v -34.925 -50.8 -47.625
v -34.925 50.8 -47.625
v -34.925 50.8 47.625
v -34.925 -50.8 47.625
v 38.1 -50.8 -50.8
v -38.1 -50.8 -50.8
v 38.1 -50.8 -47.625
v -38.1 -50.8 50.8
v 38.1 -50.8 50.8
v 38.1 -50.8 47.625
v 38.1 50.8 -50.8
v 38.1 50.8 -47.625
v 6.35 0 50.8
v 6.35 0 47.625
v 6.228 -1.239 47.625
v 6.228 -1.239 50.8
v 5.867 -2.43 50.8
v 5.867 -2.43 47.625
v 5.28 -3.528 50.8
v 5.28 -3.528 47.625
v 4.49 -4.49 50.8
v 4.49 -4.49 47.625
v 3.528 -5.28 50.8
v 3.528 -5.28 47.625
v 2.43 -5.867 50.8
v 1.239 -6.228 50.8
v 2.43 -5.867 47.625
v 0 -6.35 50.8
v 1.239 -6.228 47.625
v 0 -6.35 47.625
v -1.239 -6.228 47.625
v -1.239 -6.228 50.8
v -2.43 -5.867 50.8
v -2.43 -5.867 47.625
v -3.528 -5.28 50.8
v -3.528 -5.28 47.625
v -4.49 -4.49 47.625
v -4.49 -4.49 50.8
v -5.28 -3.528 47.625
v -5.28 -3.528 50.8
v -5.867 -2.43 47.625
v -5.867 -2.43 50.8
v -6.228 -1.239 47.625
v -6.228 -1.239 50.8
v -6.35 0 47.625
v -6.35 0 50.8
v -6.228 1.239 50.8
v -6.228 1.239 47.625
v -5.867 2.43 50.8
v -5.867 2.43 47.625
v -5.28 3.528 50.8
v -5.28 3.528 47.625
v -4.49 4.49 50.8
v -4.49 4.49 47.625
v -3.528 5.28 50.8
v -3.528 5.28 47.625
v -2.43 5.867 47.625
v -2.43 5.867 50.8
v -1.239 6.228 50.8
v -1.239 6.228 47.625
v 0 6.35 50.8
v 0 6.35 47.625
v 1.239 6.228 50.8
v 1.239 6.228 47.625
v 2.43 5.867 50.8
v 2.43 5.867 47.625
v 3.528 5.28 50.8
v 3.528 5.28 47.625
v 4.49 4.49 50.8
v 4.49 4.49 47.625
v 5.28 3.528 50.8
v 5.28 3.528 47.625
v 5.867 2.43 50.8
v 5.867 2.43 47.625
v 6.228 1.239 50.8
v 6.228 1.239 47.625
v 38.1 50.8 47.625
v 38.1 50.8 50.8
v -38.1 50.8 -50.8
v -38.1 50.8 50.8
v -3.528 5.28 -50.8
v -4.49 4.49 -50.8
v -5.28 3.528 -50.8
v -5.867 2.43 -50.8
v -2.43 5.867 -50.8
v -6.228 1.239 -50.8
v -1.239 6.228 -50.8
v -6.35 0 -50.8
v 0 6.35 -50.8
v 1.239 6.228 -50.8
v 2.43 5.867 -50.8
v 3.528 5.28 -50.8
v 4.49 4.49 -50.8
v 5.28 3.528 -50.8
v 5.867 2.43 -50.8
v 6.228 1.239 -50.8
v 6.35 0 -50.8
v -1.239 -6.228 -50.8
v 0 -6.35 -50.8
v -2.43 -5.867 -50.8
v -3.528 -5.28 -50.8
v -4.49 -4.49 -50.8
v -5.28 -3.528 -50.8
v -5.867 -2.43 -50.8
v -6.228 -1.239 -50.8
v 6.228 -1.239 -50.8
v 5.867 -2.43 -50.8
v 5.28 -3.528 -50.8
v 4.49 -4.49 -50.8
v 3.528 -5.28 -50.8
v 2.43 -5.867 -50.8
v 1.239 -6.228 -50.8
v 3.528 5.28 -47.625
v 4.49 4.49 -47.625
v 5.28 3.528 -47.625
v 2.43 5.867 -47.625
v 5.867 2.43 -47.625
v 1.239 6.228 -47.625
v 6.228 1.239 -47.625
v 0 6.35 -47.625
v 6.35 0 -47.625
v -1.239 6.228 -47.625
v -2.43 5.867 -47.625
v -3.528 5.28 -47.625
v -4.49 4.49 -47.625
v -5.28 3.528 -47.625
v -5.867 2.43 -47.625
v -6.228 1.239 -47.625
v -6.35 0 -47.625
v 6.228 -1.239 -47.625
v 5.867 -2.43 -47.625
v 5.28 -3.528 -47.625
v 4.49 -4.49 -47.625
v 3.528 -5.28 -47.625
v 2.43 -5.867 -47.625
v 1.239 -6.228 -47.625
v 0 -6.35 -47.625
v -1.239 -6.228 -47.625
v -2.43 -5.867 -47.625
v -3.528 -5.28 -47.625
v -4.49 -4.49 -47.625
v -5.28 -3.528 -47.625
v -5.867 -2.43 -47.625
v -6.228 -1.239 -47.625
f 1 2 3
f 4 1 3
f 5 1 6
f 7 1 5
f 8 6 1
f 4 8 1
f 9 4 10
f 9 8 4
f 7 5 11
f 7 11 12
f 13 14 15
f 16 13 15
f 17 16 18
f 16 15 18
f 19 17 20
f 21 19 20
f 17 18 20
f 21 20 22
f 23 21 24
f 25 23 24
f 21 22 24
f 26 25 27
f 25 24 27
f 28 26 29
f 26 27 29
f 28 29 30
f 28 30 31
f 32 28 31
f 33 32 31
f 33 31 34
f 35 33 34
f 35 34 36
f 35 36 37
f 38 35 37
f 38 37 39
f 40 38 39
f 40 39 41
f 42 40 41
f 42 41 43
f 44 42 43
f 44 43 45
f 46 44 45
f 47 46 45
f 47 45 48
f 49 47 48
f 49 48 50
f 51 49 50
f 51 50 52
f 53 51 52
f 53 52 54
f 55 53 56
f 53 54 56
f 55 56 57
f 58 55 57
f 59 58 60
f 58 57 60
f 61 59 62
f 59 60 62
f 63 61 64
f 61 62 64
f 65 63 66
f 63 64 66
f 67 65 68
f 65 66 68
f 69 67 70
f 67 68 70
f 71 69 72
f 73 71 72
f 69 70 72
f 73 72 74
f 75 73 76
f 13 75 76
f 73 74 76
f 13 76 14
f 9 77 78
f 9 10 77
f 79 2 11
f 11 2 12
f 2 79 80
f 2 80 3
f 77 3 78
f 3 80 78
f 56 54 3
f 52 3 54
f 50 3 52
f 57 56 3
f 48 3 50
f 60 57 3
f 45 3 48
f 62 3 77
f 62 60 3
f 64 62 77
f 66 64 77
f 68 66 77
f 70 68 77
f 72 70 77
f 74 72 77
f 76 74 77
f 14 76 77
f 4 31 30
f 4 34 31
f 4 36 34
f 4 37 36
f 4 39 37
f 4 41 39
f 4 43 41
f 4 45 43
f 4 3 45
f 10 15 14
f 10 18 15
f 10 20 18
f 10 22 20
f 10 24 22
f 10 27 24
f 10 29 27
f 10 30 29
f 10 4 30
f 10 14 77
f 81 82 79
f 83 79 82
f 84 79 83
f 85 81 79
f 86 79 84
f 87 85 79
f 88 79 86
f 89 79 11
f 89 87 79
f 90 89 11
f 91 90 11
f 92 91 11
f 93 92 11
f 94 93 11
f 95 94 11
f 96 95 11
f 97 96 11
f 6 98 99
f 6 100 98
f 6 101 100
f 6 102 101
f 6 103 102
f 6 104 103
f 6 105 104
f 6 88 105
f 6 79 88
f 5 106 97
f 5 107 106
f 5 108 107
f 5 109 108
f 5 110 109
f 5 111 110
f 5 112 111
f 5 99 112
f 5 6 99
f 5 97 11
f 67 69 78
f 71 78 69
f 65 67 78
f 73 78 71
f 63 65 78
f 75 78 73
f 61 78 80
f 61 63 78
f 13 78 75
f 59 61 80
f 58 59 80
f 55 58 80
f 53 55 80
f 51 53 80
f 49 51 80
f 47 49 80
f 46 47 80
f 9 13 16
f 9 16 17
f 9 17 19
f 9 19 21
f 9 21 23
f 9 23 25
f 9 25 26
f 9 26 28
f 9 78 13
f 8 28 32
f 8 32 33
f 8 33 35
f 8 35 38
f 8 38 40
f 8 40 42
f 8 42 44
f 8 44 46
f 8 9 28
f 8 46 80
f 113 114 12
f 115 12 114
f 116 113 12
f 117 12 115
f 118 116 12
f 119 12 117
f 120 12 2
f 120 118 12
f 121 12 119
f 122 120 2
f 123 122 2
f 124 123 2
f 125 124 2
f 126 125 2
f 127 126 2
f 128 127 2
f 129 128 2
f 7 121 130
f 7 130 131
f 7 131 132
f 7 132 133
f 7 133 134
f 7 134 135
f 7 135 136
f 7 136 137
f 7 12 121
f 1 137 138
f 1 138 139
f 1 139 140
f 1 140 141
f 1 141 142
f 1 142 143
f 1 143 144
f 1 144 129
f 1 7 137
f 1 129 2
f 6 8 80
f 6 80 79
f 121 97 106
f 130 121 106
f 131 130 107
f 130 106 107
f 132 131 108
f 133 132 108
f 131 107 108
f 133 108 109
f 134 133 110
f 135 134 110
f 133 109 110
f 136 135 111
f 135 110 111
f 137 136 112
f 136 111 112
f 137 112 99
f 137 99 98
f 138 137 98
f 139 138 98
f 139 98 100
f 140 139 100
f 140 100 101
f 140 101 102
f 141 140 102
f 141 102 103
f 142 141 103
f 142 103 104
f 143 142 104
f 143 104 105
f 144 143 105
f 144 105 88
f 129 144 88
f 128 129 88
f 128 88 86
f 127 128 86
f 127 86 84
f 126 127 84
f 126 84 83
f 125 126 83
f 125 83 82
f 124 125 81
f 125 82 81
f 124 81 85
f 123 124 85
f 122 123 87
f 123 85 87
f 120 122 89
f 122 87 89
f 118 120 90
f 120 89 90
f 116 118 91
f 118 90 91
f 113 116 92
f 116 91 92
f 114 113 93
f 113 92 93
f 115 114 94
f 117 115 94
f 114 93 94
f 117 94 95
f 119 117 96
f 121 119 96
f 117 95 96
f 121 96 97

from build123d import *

# Parameters (mm, degrees)
F1_DEPTH = 50.8
F2_R     = 6.35
F3_DEPTH = 101.601


with BuildPart() as f1:
    # F0 (on Front) → F1 (new body, symmetric)
    with BuildSketch(Plane.XZ):
        Polygon((38.1, 47.625), (38.1, 50.8), (-38.1, 50.8), (-38.1, -50.8), (38.1, -50.8), (38.1, -47.625), (-34.925, -47.625), (-34.925, 47.625), align=None)
    extrude(amount=F1_DEPTH, both=True)

    # F2 (on face) → F3 (cut, through all)
    with BuildSketch(Plane(origin=(0, 0, -50.8), x_dir=(1, 0, 0), z_dir=(0, 0, -1))):
        Circle(F2_R)
    extrude(amount=-F3_DEPTH, mode=Mode.SUBTRACT)


solid = f1.part
